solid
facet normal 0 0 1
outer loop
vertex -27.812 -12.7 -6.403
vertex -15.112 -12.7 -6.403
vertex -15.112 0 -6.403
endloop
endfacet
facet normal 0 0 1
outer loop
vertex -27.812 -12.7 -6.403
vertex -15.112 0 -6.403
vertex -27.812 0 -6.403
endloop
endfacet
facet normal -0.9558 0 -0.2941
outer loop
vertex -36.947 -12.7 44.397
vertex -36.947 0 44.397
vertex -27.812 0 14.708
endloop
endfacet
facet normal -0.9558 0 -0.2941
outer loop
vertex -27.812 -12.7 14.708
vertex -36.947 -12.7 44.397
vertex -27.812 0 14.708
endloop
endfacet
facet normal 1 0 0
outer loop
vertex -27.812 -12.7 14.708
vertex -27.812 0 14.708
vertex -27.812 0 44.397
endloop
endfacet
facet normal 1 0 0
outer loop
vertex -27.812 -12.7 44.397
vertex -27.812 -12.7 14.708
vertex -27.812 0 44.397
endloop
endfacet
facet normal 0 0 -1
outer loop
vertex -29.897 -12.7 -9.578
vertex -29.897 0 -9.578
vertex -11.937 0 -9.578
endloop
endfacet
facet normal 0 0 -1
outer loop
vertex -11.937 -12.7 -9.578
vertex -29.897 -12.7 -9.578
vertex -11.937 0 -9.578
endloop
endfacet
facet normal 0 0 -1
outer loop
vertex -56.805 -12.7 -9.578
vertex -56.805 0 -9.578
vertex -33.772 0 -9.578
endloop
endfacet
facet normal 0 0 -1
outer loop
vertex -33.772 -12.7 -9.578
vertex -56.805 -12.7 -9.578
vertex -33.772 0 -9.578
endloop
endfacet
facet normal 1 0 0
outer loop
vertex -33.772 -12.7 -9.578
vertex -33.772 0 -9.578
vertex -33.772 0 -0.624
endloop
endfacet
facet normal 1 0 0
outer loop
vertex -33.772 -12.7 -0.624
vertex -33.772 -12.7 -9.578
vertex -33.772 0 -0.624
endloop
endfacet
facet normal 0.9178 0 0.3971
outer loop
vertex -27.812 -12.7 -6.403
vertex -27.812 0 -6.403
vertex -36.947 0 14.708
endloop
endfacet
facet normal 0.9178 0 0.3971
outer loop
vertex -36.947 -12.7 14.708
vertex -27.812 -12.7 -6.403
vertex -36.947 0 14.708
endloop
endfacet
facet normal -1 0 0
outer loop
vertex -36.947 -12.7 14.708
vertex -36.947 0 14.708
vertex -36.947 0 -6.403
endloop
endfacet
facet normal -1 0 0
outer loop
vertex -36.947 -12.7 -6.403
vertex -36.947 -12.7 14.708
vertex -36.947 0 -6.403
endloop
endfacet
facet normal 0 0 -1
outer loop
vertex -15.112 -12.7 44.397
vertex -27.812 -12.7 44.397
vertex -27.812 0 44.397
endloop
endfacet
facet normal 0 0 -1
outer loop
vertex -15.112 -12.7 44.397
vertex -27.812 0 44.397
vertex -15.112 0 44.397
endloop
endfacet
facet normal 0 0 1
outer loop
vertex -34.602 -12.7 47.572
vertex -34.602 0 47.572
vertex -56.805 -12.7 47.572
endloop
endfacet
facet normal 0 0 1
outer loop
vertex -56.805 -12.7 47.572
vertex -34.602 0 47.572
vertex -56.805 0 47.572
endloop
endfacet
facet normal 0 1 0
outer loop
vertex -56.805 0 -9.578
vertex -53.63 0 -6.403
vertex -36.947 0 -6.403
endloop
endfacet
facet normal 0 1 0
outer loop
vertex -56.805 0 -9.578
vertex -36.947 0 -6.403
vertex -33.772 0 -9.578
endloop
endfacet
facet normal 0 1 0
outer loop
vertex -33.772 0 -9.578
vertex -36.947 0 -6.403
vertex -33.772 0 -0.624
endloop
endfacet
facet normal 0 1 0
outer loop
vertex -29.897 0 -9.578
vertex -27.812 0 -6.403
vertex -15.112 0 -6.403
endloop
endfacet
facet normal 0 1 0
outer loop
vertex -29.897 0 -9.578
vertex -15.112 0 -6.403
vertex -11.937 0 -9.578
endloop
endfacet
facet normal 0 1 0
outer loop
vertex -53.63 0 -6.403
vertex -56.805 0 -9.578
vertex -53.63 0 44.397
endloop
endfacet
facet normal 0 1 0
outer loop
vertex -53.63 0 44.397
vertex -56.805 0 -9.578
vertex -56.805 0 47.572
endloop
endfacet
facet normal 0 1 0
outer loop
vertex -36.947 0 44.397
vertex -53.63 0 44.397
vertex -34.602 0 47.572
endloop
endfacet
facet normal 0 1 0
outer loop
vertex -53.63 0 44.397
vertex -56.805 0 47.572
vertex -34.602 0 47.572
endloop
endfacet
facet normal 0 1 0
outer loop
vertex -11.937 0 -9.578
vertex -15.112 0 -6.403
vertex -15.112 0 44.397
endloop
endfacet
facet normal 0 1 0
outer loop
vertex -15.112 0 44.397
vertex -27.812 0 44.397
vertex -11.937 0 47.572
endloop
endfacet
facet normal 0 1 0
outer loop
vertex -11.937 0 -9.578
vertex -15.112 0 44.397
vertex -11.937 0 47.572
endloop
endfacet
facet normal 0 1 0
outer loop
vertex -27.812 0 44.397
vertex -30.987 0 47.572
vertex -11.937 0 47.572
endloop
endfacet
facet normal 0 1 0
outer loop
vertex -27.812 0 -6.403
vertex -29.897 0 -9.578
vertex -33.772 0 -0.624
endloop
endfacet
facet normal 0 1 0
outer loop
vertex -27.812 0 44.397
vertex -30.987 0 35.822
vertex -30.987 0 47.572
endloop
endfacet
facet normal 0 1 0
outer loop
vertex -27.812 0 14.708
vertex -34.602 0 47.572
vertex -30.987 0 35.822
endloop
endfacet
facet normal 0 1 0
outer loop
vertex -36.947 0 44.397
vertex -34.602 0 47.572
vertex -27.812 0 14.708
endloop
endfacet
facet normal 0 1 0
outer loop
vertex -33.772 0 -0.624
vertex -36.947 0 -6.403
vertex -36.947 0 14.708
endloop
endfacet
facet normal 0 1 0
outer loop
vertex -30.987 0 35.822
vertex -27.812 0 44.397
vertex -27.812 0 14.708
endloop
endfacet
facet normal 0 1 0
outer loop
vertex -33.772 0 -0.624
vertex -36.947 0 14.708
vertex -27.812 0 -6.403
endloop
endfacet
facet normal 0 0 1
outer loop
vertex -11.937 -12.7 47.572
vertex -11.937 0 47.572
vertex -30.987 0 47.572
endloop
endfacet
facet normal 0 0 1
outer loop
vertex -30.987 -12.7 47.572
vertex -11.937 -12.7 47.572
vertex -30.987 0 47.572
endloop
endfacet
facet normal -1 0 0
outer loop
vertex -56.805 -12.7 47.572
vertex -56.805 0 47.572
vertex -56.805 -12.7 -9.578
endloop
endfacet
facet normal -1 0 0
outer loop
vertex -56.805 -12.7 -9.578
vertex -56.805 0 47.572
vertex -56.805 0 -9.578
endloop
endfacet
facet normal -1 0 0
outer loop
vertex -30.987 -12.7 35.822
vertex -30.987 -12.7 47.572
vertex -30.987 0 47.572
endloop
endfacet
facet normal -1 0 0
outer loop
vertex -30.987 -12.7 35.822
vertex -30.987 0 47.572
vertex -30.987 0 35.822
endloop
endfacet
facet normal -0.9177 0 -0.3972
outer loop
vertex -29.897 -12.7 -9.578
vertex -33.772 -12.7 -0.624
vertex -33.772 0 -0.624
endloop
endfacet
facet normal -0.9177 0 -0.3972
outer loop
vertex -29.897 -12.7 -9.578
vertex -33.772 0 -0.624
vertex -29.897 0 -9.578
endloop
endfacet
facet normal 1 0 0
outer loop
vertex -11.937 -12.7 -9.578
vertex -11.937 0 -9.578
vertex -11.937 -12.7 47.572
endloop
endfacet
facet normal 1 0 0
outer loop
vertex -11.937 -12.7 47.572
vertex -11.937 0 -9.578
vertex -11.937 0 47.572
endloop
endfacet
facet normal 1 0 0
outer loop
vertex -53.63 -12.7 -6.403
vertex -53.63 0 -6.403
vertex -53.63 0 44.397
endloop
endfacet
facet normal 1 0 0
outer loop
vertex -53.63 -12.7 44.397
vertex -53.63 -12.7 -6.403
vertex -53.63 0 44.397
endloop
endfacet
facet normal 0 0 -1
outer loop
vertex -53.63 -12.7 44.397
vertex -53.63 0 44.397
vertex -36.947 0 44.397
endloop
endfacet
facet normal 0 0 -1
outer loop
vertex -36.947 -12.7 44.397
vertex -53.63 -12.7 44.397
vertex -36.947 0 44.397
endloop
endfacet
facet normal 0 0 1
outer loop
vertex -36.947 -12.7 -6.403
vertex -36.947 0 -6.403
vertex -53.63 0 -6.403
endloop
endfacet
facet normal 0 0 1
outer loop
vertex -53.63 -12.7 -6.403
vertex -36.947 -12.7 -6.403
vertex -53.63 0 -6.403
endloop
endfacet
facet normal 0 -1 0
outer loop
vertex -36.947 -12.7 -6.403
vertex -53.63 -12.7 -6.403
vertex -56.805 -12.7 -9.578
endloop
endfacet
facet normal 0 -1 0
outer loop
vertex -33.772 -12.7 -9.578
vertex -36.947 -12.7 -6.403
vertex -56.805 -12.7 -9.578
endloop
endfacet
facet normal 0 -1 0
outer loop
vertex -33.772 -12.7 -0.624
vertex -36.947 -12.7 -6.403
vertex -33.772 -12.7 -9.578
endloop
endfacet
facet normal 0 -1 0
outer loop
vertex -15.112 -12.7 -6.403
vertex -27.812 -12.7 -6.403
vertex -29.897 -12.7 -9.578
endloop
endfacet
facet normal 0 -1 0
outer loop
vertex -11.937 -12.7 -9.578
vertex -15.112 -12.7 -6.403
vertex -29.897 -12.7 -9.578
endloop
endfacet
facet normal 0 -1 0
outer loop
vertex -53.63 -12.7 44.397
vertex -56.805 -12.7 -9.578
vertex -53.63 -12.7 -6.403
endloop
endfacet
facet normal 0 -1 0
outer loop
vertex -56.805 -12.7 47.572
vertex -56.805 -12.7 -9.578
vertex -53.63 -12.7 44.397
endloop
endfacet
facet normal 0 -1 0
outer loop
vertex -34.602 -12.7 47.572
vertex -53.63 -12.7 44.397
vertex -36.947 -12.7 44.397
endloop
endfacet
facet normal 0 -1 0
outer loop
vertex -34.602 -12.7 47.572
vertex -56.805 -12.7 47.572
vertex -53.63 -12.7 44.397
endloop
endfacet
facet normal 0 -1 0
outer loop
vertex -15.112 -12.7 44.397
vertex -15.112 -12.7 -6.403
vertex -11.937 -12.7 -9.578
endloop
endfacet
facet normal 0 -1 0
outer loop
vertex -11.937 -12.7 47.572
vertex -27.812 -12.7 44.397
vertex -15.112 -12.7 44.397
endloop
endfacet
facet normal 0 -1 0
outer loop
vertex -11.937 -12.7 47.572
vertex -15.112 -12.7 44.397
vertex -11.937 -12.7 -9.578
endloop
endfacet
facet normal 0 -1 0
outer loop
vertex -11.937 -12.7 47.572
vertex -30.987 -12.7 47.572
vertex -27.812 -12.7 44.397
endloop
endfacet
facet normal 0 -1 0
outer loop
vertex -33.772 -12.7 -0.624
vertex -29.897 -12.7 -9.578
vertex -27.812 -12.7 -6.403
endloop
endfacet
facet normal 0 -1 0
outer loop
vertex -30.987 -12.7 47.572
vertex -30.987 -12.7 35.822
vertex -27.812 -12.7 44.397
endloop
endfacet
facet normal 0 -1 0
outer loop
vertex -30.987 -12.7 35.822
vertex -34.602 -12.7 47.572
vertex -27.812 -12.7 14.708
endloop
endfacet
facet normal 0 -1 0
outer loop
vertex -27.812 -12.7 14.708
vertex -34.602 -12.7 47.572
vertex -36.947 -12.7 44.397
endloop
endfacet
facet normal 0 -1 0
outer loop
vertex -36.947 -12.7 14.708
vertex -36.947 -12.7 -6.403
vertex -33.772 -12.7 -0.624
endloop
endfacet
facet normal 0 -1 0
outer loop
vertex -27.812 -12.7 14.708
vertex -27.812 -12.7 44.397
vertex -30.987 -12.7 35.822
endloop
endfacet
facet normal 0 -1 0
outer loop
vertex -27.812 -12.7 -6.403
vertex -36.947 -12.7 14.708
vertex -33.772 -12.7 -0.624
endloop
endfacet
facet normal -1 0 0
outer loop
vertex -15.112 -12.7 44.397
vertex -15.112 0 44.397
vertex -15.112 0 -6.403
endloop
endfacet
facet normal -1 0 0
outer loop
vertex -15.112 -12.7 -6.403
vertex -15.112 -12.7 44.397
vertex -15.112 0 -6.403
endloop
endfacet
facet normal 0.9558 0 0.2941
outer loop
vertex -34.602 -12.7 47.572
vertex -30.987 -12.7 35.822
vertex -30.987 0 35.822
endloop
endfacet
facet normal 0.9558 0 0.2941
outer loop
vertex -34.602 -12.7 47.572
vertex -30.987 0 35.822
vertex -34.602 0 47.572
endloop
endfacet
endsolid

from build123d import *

# Parameters (mm, degrees)
F1_DEPTH = 12.7


with BuildPart() as f1:
    # F0 (on Front) → F1 (new body)
    with BuildSketch(Plane.XZ):
        Polygon((-34.601895, 47.571581), (-56.804623, 47.571581), (-56.804623, -9.578419), (-33.77184, -9.578419), (-33.77184, -0.624114), (-29.897187, -9.578419), (-11.936555, -9.578419), (-11.936555, 47.571581), (-30.986555, 47.571581), (-30.986555, 35.822231), align=None)
        Polygon((-36.94684, -6.403419), (-53.629623, -6.403419), (-53.629623, 44.396581), (-36.94684, 44.396581), (-27.811555, 14.708183), (-27.811555, 44.396581), (-15.111555, 44.396581), (-15.111555, -6.403419), (-27.811555, -6.403419), (-36.94684, 14.708183), align=None, mode=Mode.SUBTRACT)
    extrude(amount=F1_DEPTH)


solid = f1.part
